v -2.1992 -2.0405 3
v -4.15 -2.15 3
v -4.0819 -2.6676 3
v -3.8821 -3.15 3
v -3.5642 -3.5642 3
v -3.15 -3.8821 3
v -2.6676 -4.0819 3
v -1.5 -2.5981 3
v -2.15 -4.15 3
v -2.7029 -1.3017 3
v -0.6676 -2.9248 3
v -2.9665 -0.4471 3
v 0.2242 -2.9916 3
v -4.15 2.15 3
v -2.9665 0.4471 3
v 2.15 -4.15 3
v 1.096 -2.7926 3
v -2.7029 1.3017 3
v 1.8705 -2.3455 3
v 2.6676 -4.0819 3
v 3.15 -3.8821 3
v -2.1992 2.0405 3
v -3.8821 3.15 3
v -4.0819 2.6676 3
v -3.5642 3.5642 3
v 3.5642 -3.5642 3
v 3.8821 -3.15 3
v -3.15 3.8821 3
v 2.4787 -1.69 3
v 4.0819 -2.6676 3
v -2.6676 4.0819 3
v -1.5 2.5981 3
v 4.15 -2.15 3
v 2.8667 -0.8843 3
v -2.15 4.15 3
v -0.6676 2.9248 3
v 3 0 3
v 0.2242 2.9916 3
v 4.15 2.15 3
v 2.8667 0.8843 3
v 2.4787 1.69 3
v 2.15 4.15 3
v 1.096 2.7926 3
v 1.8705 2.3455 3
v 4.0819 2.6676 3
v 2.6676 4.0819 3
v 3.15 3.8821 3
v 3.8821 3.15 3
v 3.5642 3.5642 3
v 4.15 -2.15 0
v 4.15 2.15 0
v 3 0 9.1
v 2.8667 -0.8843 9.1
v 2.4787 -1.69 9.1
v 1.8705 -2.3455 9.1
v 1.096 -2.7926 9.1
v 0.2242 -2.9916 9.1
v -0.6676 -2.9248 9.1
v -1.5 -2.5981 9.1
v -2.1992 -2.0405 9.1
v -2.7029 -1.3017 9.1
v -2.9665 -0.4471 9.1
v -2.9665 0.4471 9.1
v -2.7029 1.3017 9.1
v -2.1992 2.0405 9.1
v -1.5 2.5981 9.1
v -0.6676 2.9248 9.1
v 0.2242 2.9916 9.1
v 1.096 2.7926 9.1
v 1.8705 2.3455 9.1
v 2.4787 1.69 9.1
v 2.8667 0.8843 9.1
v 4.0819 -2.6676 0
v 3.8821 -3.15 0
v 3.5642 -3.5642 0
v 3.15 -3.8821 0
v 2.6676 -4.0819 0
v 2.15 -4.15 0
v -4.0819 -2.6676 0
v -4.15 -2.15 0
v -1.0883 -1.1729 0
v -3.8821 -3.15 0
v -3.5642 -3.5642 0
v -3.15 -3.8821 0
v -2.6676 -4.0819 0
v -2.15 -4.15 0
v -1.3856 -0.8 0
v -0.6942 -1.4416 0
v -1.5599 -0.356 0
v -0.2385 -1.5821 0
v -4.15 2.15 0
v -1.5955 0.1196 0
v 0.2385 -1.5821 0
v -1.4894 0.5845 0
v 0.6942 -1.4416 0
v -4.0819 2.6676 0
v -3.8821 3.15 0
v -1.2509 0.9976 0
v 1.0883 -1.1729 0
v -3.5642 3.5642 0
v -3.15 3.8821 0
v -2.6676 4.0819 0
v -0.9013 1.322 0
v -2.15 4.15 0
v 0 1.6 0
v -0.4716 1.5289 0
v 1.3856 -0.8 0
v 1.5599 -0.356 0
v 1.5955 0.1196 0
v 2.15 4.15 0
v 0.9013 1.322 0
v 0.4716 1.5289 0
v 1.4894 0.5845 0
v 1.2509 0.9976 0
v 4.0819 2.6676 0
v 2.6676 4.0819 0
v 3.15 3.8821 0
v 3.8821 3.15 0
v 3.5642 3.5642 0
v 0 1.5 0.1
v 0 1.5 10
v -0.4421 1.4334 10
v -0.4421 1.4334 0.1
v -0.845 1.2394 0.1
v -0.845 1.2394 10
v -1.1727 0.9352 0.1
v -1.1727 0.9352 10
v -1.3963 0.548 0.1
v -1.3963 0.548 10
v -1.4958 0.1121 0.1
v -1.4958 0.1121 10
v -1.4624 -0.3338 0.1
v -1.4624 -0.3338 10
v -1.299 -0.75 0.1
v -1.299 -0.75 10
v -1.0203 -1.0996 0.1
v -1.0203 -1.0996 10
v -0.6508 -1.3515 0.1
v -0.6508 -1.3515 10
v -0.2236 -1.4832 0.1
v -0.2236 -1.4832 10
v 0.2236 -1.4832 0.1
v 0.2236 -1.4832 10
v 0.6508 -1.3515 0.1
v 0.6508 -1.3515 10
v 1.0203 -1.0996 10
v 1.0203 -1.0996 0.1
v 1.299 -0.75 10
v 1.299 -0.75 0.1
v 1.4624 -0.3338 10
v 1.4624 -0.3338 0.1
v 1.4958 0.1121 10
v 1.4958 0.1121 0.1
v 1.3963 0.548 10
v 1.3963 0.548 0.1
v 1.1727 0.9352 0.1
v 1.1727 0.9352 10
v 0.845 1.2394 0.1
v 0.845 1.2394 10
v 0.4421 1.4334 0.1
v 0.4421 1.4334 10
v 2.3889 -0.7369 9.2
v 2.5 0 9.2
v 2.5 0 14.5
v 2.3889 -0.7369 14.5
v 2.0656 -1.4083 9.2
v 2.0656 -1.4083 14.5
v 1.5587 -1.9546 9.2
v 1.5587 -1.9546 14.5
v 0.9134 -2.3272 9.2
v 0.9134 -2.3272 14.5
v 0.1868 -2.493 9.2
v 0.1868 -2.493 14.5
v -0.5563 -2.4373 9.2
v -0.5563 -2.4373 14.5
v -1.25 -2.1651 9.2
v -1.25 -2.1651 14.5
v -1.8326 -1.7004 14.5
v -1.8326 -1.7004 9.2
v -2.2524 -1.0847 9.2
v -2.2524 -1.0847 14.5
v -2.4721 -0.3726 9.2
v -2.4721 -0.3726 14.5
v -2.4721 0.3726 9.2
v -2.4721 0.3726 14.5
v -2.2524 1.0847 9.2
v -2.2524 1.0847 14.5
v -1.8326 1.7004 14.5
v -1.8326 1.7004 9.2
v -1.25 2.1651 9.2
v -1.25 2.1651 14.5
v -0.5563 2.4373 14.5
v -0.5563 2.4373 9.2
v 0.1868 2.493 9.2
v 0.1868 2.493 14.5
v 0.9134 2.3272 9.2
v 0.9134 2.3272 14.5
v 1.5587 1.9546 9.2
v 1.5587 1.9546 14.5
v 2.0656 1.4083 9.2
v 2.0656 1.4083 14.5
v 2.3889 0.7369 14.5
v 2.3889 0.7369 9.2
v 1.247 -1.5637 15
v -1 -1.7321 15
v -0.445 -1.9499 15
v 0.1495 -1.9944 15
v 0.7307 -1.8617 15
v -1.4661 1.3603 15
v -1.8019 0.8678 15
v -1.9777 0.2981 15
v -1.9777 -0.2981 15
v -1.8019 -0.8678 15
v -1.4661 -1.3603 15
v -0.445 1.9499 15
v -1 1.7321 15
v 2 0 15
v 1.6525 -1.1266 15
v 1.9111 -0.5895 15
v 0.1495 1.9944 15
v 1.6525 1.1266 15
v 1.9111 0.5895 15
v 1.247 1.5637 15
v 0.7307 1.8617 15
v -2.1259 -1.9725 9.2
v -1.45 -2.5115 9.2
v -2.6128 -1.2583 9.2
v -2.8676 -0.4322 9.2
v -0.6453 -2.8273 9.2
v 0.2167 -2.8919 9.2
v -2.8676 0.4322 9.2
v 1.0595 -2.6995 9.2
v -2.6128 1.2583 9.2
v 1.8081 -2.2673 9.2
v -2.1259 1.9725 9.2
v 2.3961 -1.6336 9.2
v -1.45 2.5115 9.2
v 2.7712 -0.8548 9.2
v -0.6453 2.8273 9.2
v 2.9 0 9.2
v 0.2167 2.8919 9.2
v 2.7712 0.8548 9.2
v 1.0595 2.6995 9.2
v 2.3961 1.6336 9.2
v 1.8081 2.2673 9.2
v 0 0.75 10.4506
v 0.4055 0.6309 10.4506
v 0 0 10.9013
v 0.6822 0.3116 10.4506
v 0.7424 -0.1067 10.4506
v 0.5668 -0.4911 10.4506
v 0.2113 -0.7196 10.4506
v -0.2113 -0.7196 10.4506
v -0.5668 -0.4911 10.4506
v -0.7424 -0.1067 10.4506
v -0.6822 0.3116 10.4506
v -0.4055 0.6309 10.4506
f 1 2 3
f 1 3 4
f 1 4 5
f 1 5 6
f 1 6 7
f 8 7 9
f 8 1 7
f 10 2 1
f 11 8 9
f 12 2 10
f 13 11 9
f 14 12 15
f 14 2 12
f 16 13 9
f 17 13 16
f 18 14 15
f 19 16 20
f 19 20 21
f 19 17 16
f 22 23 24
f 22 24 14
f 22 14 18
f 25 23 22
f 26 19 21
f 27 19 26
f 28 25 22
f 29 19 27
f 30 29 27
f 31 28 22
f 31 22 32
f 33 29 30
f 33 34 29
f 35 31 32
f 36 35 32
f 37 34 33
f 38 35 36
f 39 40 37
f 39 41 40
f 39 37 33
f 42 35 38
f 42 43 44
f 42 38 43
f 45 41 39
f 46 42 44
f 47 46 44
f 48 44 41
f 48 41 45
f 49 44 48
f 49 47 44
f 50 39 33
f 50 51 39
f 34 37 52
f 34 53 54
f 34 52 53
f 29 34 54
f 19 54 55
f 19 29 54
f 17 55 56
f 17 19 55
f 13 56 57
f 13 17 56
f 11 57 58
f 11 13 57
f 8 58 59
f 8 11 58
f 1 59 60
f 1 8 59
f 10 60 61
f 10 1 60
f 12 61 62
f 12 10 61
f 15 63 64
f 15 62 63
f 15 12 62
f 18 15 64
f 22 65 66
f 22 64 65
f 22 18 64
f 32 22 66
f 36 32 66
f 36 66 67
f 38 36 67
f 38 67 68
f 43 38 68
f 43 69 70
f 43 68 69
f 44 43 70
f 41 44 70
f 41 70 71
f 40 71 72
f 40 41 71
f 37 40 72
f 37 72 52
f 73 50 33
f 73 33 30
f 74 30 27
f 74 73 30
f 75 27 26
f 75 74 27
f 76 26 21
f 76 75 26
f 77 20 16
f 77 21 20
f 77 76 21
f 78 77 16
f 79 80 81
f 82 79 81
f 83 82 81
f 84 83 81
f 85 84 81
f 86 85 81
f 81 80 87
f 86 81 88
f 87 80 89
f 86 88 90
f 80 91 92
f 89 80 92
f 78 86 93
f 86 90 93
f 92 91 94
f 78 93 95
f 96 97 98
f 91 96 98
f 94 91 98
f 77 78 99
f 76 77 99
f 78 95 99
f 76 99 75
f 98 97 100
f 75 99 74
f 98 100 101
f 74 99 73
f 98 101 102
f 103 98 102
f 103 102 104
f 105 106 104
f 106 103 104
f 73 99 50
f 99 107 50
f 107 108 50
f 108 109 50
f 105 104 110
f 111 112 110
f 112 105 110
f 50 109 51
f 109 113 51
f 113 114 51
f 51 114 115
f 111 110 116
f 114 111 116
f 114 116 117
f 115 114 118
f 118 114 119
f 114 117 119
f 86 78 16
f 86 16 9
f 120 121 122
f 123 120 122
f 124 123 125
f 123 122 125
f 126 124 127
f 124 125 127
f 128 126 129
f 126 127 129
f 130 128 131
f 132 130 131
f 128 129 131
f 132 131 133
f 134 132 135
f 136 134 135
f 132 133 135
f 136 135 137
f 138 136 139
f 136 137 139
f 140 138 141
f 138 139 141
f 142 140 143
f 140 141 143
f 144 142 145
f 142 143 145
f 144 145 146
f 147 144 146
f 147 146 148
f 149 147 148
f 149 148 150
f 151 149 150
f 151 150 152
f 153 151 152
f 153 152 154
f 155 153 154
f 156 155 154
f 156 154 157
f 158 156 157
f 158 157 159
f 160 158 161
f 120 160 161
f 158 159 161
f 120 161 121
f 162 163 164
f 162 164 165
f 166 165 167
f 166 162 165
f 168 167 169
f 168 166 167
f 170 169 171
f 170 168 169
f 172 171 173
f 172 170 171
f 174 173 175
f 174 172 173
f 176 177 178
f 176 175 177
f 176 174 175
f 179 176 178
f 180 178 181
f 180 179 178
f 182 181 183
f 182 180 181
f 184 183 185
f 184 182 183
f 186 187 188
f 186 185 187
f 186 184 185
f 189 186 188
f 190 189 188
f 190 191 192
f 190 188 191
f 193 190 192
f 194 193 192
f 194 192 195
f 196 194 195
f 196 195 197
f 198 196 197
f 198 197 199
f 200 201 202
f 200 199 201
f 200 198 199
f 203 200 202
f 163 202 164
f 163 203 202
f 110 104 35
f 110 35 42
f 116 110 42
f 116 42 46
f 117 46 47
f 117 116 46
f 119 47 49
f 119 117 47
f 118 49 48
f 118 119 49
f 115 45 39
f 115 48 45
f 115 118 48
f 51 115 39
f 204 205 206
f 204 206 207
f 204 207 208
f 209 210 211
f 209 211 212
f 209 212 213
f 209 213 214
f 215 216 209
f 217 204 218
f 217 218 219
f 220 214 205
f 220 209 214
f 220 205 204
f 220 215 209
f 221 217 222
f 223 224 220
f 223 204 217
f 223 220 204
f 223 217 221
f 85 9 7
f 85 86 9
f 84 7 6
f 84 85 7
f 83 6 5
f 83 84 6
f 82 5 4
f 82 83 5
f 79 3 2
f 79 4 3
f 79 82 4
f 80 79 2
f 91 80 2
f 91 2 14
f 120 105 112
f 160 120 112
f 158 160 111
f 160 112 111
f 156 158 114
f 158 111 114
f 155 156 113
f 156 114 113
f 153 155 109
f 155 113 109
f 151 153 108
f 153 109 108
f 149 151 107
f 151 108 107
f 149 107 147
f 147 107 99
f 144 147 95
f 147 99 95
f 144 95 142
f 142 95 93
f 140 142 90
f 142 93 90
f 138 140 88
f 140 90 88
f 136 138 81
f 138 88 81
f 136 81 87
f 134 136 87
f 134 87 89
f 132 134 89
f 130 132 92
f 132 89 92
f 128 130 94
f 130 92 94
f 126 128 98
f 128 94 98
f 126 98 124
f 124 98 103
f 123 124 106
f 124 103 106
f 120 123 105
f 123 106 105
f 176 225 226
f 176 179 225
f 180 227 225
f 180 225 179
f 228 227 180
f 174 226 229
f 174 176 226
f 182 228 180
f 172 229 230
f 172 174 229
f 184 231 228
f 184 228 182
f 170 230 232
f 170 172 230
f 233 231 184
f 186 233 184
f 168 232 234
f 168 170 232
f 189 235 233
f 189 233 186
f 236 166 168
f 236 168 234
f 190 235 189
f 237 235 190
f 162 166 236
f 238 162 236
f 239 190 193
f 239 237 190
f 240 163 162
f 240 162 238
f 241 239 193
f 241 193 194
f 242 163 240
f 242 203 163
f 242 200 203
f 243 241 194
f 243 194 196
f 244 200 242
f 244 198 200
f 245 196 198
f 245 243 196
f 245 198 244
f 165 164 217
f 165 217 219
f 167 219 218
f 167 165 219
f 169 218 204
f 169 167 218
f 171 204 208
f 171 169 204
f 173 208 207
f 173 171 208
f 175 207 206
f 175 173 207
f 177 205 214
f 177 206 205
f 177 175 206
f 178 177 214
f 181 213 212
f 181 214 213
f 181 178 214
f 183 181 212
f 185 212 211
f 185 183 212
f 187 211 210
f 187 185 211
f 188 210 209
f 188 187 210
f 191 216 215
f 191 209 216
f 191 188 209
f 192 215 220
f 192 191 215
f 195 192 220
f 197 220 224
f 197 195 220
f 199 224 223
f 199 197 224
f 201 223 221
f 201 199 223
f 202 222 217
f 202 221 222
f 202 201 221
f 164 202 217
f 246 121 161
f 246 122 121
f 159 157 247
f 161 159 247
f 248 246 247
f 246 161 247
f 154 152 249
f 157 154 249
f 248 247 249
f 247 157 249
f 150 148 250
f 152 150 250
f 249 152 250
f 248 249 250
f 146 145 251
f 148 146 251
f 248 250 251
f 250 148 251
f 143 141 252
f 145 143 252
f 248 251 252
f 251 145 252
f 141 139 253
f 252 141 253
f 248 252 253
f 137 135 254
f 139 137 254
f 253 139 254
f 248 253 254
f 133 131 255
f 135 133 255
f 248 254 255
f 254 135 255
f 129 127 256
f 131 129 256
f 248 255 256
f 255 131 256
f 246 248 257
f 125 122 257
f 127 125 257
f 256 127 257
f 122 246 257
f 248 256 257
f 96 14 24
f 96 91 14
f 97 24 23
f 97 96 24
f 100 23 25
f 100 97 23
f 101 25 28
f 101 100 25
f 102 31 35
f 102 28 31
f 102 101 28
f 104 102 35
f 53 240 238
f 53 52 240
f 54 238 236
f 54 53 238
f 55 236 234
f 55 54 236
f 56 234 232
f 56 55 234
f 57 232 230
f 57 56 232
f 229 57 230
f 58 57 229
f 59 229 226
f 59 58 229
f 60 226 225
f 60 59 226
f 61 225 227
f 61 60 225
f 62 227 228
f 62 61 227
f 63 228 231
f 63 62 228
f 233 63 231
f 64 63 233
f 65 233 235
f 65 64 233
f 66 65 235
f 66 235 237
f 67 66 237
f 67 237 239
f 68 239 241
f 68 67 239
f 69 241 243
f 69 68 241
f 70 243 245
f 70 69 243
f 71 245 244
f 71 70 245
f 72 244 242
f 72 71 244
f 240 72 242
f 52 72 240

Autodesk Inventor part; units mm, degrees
ref_plane "YZ Plane" through (0, 0, 0) normal (1, 0, 0) x (0, 1, 0)
ref_plane "XZ Plane" through (0, 0, 0) normal (0, 1, 0) x (-1, 0, 0)
ref_plane "XY Plane" through (0, 0, 0) normal (0, 0, 1) x (1, 0, 0)
sketch "Skizze1" plane through (0, 0, 0) normal (0, 0, 1) x (1, 0, 0)
  line L0 (-2.15, 4.15) -> (2.15, 4.15)
  line L1 (4.15, 2.15) -> (4.15, -2.15)
  line L2 (2.15, -4.15) -> (-2.15, -4.15)
  line L3 (-4.15, -2.15) -> (-4.15, 2.15)
  arc A0 (-2.15, 4.15) -> (-4.15, 2.15) centre (-2.15, 2.15) ccw
  arc A1 (4.15, 2.15) -> (2.15, 4.15) centre (2.15, 2.15) ccw
  arc A2 (2.15, -4.15) -> (4.15, -2.15) centre (2.15, -2.15) ccw
  arc A3 (-4.15, -2.15) -> (-2.15, -4.15) centre (-2.15, -2.15) ccw
  line L4 (-2.15, 2.15) -> (2.15, -2.15) construction
  line L5 (2.15, 2.15) -> (-2.15, -2.15) construction
  point P0 (0, 0)
  dimension "d0" = 2
  dimension "d1" = 8.3
extrude "Extrusion1" add sketch "Skizze1" along normal blind 3
sketch "Skizze2" plane through (0, 0, 3) normal (0, 0, 1) x (1, 0, 0)
  circle A0 centre (0, 0) radius 2.5
  circle A1 centre (0, 0) radius 3
  dimension "d4" = 5
  dimension "d22" = 6
extrude "Extrusion2" add sketch "Skizze2" along normal blind 12 contours A0
chamfer "Fase1" distance 0.5 angle 45 1 edges at (-2.5, 0, 15)
thread "Gewinde2" size "M5x0.8" class "6g" standard "ISO Metric profile" length 4.5
extrude "Extrusion3" add sketch "Skizze2" along normal blind 6.2
sketch "Skizze4" plane through (0, 0, 0) normal (0, 0, -1) x (-1, 0, 0)
  point P0 (0, 0)
  point P1 (0, 0)
hole "Bohrung2" [suppressed]
hole "Bohrung3" at (0, 0, 0) direction (0, 0, 1) diameter 3 depth 10 tip angle 118
chamfer "Fasen2" distance 0.1 angle 45 2 edges at (-3, 0, 9.2) (0, -1.5, 0)
chamfer "Fasen3" [suppressed]
properties part number "RadadapterCLOSED"
